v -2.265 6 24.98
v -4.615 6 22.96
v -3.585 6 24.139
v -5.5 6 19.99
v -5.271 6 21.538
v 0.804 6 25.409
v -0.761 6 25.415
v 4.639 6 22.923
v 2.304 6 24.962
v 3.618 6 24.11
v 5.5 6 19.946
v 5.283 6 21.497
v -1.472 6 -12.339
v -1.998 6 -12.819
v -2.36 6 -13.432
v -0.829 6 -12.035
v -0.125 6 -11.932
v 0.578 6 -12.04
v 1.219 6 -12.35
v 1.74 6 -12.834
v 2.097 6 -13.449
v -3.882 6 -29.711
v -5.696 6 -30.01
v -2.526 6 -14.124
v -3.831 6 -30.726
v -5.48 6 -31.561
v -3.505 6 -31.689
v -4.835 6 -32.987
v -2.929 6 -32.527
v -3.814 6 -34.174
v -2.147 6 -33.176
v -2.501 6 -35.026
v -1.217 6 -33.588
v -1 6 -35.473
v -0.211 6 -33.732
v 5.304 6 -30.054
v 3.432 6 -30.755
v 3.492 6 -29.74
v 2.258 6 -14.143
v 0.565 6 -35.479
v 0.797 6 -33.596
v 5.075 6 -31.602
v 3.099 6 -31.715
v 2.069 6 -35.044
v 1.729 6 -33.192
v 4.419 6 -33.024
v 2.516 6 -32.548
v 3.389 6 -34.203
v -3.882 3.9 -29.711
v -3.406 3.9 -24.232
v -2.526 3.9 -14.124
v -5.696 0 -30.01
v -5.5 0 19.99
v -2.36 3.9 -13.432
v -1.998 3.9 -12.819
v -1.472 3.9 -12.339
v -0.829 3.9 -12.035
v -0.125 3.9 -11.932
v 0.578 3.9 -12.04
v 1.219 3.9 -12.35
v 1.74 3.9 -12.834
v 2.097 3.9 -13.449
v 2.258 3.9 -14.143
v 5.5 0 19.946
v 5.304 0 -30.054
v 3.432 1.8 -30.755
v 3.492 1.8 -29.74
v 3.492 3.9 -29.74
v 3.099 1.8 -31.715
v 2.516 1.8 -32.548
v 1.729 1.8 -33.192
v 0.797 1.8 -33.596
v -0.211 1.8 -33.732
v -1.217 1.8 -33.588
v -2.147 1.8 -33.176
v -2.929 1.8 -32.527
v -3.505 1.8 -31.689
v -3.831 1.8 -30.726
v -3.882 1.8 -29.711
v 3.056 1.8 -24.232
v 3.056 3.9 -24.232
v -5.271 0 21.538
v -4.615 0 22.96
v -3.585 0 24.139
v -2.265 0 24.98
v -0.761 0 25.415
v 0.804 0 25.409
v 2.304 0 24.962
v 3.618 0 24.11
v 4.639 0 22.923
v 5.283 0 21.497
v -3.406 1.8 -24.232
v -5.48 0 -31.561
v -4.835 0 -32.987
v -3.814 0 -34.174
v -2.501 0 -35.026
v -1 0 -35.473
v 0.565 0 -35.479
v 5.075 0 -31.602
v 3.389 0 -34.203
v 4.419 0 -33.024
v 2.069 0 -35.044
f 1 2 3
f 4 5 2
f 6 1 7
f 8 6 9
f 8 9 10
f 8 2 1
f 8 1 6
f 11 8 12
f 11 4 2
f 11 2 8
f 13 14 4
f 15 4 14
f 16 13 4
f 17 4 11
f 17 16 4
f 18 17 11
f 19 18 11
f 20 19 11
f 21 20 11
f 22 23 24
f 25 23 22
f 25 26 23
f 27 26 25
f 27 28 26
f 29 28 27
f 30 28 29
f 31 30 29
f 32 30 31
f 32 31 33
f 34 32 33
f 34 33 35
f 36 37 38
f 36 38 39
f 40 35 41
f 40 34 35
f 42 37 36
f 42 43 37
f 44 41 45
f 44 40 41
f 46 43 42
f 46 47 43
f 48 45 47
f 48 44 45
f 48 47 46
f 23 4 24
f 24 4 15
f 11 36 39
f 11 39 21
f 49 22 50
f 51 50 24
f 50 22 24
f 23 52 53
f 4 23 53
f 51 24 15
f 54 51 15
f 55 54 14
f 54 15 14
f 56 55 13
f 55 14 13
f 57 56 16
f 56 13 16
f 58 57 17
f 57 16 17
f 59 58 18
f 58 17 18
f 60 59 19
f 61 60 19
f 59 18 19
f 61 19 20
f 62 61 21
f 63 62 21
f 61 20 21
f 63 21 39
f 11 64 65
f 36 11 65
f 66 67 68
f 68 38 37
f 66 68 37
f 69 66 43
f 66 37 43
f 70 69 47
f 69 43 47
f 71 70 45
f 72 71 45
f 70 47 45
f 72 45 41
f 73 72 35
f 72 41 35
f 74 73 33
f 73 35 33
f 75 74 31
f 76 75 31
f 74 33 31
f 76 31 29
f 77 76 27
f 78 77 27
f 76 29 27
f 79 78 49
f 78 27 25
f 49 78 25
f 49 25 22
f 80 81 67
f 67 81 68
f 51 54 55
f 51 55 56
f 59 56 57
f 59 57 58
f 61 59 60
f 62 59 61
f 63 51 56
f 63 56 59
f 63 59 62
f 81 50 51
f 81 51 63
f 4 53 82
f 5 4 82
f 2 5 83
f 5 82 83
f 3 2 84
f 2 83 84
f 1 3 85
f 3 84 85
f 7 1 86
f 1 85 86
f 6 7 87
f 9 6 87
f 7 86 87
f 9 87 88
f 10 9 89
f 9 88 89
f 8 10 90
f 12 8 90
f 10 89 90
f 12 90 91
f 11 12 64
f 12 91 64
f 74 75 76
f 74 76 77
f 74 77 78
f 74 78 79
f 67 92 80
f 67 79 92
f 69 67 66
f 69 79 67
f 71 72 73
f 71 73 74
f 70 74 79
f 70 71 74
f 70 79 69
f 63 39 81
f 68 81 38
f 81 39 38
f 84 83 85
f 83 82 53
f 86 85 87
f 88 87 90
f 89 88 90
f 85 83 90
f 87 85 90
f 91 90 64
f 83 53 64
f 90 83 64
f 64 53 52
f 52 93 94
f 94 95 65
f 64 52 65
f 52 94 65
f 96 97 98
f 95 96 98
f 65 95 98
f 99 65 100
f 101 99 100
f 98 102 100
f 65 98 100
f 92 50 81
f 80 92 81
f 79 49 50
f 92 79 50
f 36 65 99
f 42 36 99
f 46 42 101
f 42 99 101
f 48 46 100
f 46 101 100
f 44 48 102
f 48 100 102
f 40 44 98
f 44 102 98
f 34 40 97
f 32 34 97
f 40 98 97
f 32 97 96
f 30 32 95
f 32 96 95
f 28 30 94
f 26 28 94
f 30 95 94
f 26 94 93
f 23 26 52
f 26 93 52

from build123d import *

# Parameters (mm, degrees)
EXTRUDE_1_DEPTH     = 6
CUT_EXTRUDE_1_DEPTH = 2.1
CUT_EXTRUDE_2_DEPTH = 2.1


with BuildPart() as part:
    # Эскиз2 → Бобышка-Вытянуть1 (new body)
    with BuildSketch(Plane(origin=(0, 0, 0), x_dir=(1, 0, 0), z_dir=(0, 1, 0))):
        with BuildLine():
            Line((-5.696343687, 30.010357476), (-5.499915116, -19.989642524))
            ThreePointArc((-5.499915116, -19.989642524), (0.021649418, -25.467993105), (5.5, -19.946428571))
            Line((5.5, -19.946428571), (5.303571429, 30.053571429))
            ThreePointArc((5.303571429, 30.053571429), (-0.217993105, 35.53192201), (-5.696343687, 30.010357476))
        make_face()
    extrude(amount=EXTRUDE_1_DEPTH)

    # Эскиз3 → Вырез-Вытянуть1 (cut)
    with BuildSketch(Plane(origin=(0, 6, 0), x_dir=(1, 0, 0), z_dir=(0, 1, 0))):
        with BuildLine():
            Line((-3.882448388, 29.711113982), (-2.525666878, 14.123849568))
            ThreePointArc((-2.525666878, 14.123849568), (-0.125279076, 11.931987312), (2.257813124, 14.142641811))
            Line((2.257813124, 14.142641811), (3.492083281, 29.740085357))
            ThreePointArc((3.492083281, 29.740085357), (-0.210921731, 33.7319359), (-3.882448388, 29.711113982))
        make_face()
    extrude(amount=-CUT_EXTRUDE_1_DEPTH, mode=Mode.SUBTRACT)

    # Эскиз4 → Вырез-Вытянуть2 (cut)
    with BuildSketch(Plane(origin=(0, 3.9, 0), x_dir=(1, 0, 0), z_dir=(0, 1, 0))):
        with BuildLine():
            Line((-3.405520008, 24.231964452), (3.056209977, 24.231964452))
            Line((3.056209977, 24.231964452), (3.492083281, 29.740085357))
            ThreePointArc((3.492083281, 29.740085357), (-0.210921731, 33.7319359), (-3.882448388, 29.711113982))
            Line((-3.882448388, 29.711113982), (-3.405520008, 24.231964452))
        make_face()
    extrude(amount=-CUT_EXTRUDE_2_DEPTH, mode=Mode.SUBTRACT)


solid = part.part
